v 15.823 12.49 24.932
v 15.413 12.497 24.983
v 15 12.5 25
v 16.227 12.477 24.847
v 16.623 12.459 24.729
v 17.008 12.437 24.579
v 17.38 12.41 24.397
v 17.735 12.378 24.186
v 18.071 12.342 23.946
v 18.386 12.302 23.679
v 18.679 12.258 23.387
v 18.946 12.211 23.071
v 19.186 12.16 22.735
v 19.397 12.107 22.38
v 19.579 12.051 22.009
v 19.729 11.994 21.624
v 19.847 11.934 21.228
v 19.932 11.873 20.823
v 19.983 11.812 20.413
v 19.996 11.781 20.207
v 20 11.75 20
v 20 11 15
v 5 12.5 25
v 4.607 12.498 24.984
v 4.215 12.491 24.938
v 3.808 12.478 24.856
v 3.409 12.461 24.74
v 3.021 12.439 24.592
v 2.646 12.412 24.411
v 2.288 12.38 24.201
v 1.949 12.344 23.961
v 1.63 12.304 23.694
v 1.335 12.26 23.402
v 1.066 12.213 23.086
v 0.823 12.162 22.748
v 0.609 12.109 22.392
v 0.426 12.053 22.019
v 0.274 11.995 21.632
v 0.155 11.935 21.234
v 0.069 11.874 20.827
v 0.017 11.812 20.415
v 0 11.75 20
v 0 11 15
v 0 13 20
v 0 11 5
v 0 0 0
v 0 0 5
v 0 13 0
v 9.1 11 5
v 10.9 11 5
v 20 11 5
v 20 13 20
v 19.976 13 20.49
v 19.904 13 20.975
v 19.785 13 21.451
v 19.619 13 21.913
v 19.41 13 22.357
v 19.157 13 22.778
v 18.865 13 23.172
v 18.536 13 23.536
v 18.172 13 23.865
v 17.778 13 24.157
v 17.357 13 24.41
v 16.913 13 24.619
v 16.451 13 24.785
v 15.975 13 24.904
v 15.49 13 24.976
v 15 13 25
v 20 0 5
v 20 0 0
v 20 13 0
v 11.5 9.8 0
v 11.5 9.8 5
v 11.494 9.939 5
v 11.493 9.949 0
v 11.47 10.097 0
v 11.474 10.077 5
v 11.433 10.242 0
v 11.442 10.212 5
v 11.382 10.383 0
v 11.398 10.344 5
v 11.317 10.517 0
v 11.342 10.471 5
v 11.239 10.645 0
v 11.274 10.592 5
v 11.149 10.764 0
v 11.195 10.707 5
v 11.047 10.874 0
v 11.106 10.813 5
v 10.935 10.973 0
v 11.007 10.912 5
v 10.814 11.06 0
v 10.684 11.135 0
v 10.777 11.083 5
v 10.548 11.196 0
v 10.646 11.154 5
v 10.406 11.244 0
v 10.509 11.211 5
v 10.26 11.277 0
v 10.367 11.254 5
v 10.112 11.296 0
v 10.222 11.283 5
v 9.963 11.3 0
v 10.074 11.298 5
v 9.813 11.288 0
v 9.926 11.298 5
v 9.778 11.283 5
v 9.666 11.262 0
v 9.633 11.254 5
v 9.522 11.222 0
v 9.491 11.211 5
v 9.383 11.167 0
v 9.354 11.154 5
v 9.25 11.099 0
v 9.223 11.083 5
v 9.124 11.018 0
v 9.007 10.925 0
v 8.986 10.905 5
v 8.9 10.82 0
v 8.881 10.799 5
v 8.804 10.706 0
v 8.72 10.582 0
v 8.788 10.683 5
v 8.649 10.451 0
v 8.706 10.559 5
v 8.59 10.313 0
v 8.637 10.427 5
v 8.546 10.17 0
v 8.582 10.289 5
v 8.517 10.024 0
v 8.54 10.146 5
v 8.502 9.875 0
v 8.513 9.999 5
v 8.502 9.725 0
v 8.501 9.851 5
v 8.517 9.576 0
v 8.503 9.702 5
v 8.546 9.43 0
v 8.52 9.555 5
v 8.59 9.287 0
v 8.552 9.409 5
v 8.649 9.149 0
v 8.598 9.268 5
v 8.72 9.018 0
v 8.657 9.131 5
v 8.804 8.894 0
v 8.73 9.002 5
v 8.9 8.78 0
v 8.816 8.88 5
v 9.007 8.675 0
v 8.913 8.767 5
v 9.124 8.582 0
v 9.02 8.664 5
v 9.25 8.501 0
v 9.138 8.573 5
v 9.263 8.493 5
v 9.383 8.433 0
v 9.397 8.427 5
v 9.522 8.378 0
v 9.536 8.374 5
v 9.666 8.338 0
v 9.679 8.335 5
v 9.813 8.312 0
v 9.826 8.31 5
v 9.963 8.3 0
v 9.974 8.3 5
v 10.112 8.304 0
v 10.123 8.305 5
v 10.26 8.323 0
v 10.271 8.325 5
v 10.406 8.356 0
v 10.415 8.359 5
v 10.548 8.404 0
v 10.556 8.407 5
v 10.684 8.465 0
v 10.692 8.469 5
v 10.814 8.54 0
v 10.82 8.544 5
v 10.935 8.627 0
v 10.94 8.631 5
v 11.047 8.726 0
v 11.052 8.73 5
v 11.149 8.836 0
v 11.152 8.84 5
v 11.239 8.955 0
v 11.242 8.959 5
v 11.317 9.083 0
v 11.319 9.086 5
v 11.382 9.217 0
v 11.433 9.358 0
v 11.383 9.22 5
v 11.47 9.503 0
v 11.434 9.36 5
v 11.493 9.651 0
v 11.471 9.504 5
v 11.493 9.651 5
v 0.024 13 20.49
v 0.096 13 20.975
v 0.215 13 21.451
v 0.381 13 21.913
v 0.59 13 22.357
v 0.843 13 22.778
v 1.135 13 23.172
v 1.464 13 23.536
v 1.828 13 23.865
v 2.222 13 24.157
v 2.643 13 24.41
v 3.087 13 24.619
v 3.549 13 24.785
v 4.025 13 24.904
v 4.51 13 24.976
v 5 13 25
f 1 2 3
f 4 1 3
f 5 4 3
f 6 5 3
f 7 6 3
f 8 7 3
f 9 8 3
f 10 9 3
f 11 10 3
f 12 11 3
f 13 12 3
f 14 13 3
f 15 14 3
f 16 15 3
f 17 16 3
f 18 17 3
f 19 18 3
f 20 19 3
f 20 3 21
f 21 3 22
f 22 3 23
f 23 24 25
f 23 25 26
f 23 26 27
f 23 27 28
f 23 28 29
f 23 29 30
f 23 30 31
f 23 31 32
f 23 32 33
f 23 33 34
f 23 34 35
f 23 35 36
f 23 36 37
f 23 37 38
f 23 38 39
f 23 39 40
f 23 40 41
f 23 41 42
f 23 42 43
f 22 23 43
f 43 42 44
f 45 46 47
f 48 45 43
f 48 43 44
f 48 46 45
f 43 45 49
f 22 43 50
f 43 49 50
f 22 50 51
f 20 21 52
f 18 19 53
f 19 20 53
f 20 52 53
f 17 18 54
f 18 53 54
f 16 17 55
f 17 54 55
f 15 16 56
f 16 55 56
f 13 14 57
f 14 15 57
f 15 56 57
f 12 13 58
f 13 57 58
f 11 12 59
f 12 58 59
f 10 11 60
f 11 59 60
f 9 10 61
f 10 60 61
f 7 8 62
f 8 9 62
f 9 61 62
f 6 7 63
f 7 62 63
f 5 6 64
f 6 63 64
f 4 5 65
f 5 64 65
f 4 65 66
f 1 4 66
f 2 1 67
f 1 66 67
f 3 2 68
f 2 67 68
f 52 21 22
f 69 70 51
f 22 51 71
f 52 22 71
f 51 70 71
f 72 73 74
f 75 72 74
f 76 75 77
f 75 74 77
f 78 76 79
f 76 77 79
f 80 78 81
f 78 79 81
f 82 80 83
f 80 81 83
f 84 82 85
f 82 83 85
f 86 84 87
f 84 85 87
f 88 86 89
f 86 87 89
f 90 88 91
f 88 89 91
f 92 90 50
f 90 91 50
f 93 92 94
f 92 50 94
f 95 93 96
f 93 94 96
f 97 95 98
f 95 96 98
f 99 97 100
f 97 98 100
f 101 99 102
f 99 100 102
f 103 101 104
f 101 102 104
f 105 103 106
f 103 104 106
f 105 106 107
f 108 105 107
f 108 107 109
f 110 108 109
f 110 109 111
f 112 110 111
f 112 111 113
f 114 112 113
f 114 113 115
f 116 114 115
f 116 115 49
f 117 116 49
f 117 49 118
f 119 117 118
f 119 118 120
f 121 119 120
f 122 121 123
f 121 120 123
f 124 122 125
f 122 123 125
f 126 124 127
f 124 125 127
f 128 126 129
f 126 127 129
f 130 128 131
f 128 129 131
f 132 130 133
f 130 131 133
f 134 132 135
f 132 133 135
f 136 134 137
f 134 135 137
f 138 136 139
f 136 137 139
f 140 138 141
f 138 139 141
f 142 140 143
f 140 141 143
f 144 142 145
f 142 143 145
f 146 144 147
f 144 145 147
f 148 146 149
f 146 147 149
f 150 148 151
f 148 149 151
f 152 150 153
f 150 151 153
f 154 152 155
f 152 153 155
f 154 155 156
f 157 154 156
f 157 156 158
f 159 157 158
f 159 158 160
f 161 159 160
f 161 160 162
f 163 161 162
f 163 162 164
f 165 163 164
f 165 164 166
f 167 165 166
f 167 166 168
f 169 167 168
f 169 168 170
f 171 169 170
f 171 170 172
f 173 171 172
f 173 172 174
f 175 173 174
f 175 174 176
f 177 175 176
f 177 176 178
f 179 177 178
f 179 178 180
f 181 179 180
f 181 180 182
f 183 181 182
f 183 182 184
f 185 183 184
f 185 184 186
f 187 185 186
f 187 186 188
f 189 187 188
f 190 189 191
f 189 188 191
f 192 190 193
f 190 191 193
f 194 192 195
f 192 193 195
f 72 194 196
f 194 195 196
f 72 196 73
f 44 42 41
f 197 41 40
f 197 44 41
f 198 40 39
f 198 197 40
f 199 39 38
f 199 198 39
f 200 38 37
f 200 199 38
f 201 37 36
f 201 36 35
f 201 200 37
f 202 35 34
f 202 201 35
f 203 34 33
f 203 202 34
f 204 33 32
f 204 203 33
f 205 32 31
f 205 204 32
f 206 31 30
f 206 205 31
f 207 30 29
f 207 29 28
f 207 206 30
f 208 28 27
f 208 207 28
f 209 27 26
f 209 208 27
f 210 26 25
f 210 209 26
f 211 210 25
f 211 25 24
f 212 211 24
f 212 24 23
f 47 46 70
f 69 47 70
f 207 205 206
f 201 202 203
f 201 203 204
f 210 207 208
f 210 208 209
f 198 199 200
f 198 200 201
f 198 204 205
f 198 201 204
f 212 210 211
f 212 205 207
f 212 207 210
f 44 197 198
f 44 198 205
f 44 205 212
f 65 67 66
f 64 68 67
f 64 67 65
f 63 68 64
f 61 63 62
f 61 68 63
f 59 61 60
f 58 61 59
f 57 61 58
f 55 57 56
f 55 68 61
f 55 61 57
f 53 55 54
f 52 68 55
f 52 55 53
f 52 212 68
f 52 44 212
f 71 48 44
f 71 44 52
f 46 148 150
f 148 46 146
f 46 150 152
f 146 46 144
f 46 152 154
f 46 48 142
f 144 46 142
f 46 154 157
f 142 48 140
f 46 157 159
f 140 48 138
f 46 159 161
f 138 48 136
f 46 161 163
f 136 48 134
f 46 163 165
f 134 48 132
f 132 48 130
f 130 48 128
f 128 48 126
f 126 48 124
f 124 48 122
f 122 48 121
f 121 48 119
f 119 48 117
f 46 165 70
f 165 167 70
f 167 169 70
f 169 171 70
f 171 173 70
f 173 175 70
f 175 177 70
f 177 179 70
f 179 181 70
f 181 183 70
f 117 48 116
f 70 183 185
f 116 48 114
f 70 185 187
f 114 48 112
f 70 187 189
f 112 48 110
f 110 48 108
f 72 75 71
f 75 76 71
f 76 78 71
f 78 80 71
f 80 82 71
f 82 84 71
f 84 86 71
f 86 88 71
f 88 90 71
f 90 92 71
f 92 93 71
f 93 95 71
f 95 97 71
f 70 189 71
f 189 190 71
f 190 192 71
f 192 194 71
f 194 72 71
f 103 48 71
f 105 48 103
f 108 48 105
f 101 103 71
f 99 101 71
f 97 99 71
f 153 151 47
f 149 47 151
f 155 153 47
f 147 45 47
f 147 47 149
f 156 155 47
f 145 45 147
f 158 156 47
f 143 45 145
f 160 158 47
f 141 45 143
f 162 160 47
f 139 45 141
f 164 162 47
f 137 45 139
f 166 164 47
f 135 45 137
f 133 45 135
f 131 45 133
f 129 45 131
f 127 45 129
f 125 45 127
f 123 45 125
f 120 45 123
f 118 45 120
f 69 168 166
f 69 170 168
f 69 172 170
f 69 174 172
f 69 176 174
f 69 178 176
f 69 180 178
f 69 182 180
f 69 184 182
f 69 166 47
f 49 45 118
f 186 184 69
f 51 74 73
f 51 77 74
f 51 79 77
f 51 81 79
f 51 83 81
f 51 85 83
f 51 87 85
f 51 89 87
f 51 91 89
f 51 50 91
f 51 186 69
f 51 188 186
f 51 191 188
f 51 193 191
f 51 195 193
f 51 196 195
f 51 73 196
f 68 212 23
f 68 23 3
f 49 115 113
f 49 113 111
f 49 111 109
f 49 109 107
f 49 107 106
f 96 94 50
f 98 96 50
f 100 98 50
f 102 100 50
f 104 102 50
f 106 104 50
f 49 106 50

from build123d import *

# Parameters (mm, degrees)
F0_W     = 20
F0_H     = 13
F1_DEPTH = 5
F2_W     = 20
F2_H     = 2
F3_DEPTH = 20
F4_R     = 5
F7_DEPTH = 25
F5_R     = 1.5
F8_DEPTH = 25


with BuildPart() as f1:
    # F0 (on Top) → F1 (new body)
    with BuildSketch(Plane.XY):
        with Locations((10, 6.5)):
            Rectangle(F0_W, F0_H)
    extrude(amount=F1_DEPTH)

    # F2 (on face) → F3 (join)
    with BuildSketch(Plane.XY.offset(5)):
        with Locations((10, 12)):
            Rectangle(F2_W, F2_H)
    extrude(amount=F3_DEPTH)

    # F4
    f4_edges = [f1.edges().sort_by_distance(p)[0] for p in [
        (0, 12, 25),
        (20, 12, 25),
    ]]
    fillet(f4_edges, radius=F4_R)

    # F6 (on face) → F7 (cut)
    with BuildSketch(Plane(origin=(0, 0, 0), x_dir=(0, -1, 0), z_dir=(-1, 0, 0))):
        Polygon((-11, 25), (-12.5, 25), (-11, 15), align=None)
    extrude(amount=-F7_DEPTH, mode=Mode.SUBTRACT)

    # F5 (on face) → F8 (cut)
    with BuildSketch(Plane.XY.offset(5)):
        with Locations((10, 9.8)):
            Circle(F5_R)
    extrude(amount=-F8_DEPTH, mode=Mode.SUBTRACT)


solid = f1.part
